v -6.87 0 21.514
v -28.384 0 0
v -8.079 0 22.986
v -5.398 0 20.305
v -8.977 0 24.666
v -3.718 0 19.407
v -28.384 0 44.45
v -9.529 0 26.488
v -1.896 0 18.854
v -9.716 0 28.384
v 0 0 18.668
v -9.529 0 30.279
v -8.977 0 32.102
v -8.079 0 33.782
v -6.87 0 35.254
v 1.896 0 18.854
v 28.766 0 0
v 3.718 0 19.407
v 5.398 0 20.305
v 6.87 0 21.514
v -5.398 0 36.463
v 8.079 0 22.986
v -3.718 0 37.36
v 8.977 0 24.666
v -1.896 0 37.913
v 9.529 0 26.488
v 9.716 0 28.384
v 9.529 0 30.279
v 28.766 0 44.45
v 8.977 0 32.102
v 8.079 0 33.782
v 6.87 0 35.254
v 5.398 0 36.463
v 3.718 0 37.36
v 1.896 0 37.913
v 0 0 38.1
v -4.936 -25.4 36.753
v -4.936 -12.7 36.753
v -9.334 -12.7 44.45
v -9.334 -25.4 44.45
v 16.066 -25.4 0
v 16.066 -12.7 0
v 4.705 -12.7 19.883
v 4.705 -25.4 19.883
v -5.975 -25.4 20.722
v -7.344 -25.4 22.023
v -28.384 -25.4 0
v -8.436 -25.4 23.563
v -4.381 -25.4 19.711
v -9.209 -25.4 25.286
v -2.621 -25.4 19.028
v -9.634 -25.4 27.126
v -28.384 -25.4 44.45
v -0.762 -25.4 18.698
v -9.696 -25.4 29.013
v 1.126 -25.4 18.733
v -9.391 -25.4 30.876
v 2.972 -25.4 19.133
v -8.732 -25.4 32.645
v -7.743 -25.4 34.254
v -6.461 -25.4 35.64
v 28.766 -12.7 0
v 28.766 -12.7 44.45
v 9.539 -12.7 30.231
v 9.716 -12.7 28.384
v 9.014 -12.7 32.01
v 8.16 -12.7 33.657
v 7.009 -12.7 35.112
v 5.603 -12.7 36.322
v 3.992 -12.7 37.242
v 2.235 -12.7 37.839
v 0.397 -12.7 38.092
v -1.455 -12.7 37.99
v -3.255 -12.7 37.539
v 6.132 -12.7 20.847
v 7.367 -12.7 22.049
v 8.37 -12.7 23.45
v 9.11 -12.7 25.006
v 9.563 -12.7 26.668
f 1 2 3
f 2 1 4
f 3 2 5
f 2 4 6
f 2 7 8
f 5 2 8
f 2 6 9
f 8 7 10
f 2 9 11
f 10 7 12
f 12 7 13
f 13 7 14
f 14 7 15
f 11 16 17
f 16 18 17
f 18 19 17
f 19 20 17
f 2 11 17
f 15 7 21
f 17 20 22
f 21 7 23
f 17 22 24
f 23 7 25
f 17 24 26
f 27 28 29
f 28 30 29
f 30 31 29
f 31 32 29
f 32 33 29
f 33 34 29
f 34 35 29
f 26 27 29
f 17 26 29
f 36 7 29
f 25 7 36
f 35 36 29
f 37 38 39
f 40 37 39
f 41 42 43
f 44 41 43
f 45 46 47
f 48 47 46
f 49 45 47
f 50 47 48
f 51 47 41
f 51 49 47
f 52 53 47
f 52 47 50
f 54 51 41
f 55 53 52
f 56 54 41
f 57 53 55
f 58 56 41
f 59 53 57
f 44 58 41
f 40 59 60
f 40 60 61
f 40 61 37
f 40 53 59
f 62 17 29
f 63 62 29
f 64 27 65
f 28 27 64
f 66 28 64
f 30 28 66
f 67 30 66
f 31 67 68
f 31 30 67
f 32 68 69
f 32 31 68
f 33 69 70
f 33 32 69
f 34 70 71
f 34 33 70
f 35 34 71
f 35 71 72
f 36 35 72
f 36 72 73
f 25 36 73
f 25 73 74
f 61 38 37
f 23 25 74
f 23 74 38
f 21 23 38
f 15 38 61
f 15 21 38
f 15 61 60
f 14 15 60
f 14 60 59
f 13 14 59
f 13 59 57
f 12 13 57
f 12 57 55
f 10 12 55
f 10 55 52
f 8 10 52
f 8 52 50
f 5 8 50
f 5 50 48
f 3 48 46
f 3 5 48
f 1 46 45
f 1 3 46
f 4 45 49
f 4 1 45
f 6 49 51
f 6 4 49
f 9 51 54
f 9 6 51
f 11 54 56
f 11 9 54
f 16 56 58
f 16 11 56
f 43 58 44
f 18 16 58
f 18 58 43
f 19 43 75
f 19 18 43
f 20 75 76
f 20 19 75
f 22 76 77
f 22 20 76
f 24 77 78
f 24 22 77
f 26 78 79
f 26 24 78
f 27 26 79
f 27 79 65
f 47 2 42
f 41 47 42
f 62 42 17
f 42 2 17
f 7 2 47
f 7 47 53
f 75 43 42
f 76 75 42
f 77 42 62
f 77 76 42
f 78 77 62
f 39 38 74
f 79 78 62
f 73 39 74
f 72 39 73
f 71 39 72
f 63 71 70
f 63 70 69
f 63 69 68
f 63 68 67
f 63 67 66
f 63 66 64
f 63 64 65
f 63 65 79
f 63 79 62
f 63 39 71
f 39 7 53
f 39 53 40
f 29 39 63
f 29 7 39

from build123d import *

# Parameters (mm, degrees)
F0_W     = 57.15
F0_H     = 44.45
F1_DEPTH = 25.4
F2_W     = 38.1
F2_H     = 12.7
F3_DEPTH = 44.45
F5_DEPTH = 12.7
F6_R     = 9.716138
F7_DEPTH = 25.401


with BuildPart() as f1:
    # F0 (on Front) → F1 (new body)
    with BuildSketch(Plane.XZ):
        with Locations((0.191138, 22.225)):
            Rectangle(F0_W, F0_H)
    extrude(amount=F1_DEPTH)

    # F2 (on face) → F3 (cut)
    with BuildSketch(Plane.XY.offset(44.45)):
        with Locations((9.716138, -19.05)):
            Rectangle(F2_W, F2_H)
    extrude(amount=-F3_DEPTH, mode=Mode.SUBTRACT)

    # F4 (on face) → F5 (join)
    with BuildSketch(Plane.XZ.offset(12.7)):
        Polygon((16.066138, 0), (-9.333862, 44.45), (-9.333862, 0), align=None)
    extrude(amount=F5_DEPTH)

    # F6 (on Front) → F7 (cut, through all)
    with BuildSketch(Plane.XZ):
        with Locations((0, 28.383862)):
            Circle(F6_R)
    extrude(amount=F7_DEPTH, mode=Mode.SUBTRACT)


solid = f1.part
